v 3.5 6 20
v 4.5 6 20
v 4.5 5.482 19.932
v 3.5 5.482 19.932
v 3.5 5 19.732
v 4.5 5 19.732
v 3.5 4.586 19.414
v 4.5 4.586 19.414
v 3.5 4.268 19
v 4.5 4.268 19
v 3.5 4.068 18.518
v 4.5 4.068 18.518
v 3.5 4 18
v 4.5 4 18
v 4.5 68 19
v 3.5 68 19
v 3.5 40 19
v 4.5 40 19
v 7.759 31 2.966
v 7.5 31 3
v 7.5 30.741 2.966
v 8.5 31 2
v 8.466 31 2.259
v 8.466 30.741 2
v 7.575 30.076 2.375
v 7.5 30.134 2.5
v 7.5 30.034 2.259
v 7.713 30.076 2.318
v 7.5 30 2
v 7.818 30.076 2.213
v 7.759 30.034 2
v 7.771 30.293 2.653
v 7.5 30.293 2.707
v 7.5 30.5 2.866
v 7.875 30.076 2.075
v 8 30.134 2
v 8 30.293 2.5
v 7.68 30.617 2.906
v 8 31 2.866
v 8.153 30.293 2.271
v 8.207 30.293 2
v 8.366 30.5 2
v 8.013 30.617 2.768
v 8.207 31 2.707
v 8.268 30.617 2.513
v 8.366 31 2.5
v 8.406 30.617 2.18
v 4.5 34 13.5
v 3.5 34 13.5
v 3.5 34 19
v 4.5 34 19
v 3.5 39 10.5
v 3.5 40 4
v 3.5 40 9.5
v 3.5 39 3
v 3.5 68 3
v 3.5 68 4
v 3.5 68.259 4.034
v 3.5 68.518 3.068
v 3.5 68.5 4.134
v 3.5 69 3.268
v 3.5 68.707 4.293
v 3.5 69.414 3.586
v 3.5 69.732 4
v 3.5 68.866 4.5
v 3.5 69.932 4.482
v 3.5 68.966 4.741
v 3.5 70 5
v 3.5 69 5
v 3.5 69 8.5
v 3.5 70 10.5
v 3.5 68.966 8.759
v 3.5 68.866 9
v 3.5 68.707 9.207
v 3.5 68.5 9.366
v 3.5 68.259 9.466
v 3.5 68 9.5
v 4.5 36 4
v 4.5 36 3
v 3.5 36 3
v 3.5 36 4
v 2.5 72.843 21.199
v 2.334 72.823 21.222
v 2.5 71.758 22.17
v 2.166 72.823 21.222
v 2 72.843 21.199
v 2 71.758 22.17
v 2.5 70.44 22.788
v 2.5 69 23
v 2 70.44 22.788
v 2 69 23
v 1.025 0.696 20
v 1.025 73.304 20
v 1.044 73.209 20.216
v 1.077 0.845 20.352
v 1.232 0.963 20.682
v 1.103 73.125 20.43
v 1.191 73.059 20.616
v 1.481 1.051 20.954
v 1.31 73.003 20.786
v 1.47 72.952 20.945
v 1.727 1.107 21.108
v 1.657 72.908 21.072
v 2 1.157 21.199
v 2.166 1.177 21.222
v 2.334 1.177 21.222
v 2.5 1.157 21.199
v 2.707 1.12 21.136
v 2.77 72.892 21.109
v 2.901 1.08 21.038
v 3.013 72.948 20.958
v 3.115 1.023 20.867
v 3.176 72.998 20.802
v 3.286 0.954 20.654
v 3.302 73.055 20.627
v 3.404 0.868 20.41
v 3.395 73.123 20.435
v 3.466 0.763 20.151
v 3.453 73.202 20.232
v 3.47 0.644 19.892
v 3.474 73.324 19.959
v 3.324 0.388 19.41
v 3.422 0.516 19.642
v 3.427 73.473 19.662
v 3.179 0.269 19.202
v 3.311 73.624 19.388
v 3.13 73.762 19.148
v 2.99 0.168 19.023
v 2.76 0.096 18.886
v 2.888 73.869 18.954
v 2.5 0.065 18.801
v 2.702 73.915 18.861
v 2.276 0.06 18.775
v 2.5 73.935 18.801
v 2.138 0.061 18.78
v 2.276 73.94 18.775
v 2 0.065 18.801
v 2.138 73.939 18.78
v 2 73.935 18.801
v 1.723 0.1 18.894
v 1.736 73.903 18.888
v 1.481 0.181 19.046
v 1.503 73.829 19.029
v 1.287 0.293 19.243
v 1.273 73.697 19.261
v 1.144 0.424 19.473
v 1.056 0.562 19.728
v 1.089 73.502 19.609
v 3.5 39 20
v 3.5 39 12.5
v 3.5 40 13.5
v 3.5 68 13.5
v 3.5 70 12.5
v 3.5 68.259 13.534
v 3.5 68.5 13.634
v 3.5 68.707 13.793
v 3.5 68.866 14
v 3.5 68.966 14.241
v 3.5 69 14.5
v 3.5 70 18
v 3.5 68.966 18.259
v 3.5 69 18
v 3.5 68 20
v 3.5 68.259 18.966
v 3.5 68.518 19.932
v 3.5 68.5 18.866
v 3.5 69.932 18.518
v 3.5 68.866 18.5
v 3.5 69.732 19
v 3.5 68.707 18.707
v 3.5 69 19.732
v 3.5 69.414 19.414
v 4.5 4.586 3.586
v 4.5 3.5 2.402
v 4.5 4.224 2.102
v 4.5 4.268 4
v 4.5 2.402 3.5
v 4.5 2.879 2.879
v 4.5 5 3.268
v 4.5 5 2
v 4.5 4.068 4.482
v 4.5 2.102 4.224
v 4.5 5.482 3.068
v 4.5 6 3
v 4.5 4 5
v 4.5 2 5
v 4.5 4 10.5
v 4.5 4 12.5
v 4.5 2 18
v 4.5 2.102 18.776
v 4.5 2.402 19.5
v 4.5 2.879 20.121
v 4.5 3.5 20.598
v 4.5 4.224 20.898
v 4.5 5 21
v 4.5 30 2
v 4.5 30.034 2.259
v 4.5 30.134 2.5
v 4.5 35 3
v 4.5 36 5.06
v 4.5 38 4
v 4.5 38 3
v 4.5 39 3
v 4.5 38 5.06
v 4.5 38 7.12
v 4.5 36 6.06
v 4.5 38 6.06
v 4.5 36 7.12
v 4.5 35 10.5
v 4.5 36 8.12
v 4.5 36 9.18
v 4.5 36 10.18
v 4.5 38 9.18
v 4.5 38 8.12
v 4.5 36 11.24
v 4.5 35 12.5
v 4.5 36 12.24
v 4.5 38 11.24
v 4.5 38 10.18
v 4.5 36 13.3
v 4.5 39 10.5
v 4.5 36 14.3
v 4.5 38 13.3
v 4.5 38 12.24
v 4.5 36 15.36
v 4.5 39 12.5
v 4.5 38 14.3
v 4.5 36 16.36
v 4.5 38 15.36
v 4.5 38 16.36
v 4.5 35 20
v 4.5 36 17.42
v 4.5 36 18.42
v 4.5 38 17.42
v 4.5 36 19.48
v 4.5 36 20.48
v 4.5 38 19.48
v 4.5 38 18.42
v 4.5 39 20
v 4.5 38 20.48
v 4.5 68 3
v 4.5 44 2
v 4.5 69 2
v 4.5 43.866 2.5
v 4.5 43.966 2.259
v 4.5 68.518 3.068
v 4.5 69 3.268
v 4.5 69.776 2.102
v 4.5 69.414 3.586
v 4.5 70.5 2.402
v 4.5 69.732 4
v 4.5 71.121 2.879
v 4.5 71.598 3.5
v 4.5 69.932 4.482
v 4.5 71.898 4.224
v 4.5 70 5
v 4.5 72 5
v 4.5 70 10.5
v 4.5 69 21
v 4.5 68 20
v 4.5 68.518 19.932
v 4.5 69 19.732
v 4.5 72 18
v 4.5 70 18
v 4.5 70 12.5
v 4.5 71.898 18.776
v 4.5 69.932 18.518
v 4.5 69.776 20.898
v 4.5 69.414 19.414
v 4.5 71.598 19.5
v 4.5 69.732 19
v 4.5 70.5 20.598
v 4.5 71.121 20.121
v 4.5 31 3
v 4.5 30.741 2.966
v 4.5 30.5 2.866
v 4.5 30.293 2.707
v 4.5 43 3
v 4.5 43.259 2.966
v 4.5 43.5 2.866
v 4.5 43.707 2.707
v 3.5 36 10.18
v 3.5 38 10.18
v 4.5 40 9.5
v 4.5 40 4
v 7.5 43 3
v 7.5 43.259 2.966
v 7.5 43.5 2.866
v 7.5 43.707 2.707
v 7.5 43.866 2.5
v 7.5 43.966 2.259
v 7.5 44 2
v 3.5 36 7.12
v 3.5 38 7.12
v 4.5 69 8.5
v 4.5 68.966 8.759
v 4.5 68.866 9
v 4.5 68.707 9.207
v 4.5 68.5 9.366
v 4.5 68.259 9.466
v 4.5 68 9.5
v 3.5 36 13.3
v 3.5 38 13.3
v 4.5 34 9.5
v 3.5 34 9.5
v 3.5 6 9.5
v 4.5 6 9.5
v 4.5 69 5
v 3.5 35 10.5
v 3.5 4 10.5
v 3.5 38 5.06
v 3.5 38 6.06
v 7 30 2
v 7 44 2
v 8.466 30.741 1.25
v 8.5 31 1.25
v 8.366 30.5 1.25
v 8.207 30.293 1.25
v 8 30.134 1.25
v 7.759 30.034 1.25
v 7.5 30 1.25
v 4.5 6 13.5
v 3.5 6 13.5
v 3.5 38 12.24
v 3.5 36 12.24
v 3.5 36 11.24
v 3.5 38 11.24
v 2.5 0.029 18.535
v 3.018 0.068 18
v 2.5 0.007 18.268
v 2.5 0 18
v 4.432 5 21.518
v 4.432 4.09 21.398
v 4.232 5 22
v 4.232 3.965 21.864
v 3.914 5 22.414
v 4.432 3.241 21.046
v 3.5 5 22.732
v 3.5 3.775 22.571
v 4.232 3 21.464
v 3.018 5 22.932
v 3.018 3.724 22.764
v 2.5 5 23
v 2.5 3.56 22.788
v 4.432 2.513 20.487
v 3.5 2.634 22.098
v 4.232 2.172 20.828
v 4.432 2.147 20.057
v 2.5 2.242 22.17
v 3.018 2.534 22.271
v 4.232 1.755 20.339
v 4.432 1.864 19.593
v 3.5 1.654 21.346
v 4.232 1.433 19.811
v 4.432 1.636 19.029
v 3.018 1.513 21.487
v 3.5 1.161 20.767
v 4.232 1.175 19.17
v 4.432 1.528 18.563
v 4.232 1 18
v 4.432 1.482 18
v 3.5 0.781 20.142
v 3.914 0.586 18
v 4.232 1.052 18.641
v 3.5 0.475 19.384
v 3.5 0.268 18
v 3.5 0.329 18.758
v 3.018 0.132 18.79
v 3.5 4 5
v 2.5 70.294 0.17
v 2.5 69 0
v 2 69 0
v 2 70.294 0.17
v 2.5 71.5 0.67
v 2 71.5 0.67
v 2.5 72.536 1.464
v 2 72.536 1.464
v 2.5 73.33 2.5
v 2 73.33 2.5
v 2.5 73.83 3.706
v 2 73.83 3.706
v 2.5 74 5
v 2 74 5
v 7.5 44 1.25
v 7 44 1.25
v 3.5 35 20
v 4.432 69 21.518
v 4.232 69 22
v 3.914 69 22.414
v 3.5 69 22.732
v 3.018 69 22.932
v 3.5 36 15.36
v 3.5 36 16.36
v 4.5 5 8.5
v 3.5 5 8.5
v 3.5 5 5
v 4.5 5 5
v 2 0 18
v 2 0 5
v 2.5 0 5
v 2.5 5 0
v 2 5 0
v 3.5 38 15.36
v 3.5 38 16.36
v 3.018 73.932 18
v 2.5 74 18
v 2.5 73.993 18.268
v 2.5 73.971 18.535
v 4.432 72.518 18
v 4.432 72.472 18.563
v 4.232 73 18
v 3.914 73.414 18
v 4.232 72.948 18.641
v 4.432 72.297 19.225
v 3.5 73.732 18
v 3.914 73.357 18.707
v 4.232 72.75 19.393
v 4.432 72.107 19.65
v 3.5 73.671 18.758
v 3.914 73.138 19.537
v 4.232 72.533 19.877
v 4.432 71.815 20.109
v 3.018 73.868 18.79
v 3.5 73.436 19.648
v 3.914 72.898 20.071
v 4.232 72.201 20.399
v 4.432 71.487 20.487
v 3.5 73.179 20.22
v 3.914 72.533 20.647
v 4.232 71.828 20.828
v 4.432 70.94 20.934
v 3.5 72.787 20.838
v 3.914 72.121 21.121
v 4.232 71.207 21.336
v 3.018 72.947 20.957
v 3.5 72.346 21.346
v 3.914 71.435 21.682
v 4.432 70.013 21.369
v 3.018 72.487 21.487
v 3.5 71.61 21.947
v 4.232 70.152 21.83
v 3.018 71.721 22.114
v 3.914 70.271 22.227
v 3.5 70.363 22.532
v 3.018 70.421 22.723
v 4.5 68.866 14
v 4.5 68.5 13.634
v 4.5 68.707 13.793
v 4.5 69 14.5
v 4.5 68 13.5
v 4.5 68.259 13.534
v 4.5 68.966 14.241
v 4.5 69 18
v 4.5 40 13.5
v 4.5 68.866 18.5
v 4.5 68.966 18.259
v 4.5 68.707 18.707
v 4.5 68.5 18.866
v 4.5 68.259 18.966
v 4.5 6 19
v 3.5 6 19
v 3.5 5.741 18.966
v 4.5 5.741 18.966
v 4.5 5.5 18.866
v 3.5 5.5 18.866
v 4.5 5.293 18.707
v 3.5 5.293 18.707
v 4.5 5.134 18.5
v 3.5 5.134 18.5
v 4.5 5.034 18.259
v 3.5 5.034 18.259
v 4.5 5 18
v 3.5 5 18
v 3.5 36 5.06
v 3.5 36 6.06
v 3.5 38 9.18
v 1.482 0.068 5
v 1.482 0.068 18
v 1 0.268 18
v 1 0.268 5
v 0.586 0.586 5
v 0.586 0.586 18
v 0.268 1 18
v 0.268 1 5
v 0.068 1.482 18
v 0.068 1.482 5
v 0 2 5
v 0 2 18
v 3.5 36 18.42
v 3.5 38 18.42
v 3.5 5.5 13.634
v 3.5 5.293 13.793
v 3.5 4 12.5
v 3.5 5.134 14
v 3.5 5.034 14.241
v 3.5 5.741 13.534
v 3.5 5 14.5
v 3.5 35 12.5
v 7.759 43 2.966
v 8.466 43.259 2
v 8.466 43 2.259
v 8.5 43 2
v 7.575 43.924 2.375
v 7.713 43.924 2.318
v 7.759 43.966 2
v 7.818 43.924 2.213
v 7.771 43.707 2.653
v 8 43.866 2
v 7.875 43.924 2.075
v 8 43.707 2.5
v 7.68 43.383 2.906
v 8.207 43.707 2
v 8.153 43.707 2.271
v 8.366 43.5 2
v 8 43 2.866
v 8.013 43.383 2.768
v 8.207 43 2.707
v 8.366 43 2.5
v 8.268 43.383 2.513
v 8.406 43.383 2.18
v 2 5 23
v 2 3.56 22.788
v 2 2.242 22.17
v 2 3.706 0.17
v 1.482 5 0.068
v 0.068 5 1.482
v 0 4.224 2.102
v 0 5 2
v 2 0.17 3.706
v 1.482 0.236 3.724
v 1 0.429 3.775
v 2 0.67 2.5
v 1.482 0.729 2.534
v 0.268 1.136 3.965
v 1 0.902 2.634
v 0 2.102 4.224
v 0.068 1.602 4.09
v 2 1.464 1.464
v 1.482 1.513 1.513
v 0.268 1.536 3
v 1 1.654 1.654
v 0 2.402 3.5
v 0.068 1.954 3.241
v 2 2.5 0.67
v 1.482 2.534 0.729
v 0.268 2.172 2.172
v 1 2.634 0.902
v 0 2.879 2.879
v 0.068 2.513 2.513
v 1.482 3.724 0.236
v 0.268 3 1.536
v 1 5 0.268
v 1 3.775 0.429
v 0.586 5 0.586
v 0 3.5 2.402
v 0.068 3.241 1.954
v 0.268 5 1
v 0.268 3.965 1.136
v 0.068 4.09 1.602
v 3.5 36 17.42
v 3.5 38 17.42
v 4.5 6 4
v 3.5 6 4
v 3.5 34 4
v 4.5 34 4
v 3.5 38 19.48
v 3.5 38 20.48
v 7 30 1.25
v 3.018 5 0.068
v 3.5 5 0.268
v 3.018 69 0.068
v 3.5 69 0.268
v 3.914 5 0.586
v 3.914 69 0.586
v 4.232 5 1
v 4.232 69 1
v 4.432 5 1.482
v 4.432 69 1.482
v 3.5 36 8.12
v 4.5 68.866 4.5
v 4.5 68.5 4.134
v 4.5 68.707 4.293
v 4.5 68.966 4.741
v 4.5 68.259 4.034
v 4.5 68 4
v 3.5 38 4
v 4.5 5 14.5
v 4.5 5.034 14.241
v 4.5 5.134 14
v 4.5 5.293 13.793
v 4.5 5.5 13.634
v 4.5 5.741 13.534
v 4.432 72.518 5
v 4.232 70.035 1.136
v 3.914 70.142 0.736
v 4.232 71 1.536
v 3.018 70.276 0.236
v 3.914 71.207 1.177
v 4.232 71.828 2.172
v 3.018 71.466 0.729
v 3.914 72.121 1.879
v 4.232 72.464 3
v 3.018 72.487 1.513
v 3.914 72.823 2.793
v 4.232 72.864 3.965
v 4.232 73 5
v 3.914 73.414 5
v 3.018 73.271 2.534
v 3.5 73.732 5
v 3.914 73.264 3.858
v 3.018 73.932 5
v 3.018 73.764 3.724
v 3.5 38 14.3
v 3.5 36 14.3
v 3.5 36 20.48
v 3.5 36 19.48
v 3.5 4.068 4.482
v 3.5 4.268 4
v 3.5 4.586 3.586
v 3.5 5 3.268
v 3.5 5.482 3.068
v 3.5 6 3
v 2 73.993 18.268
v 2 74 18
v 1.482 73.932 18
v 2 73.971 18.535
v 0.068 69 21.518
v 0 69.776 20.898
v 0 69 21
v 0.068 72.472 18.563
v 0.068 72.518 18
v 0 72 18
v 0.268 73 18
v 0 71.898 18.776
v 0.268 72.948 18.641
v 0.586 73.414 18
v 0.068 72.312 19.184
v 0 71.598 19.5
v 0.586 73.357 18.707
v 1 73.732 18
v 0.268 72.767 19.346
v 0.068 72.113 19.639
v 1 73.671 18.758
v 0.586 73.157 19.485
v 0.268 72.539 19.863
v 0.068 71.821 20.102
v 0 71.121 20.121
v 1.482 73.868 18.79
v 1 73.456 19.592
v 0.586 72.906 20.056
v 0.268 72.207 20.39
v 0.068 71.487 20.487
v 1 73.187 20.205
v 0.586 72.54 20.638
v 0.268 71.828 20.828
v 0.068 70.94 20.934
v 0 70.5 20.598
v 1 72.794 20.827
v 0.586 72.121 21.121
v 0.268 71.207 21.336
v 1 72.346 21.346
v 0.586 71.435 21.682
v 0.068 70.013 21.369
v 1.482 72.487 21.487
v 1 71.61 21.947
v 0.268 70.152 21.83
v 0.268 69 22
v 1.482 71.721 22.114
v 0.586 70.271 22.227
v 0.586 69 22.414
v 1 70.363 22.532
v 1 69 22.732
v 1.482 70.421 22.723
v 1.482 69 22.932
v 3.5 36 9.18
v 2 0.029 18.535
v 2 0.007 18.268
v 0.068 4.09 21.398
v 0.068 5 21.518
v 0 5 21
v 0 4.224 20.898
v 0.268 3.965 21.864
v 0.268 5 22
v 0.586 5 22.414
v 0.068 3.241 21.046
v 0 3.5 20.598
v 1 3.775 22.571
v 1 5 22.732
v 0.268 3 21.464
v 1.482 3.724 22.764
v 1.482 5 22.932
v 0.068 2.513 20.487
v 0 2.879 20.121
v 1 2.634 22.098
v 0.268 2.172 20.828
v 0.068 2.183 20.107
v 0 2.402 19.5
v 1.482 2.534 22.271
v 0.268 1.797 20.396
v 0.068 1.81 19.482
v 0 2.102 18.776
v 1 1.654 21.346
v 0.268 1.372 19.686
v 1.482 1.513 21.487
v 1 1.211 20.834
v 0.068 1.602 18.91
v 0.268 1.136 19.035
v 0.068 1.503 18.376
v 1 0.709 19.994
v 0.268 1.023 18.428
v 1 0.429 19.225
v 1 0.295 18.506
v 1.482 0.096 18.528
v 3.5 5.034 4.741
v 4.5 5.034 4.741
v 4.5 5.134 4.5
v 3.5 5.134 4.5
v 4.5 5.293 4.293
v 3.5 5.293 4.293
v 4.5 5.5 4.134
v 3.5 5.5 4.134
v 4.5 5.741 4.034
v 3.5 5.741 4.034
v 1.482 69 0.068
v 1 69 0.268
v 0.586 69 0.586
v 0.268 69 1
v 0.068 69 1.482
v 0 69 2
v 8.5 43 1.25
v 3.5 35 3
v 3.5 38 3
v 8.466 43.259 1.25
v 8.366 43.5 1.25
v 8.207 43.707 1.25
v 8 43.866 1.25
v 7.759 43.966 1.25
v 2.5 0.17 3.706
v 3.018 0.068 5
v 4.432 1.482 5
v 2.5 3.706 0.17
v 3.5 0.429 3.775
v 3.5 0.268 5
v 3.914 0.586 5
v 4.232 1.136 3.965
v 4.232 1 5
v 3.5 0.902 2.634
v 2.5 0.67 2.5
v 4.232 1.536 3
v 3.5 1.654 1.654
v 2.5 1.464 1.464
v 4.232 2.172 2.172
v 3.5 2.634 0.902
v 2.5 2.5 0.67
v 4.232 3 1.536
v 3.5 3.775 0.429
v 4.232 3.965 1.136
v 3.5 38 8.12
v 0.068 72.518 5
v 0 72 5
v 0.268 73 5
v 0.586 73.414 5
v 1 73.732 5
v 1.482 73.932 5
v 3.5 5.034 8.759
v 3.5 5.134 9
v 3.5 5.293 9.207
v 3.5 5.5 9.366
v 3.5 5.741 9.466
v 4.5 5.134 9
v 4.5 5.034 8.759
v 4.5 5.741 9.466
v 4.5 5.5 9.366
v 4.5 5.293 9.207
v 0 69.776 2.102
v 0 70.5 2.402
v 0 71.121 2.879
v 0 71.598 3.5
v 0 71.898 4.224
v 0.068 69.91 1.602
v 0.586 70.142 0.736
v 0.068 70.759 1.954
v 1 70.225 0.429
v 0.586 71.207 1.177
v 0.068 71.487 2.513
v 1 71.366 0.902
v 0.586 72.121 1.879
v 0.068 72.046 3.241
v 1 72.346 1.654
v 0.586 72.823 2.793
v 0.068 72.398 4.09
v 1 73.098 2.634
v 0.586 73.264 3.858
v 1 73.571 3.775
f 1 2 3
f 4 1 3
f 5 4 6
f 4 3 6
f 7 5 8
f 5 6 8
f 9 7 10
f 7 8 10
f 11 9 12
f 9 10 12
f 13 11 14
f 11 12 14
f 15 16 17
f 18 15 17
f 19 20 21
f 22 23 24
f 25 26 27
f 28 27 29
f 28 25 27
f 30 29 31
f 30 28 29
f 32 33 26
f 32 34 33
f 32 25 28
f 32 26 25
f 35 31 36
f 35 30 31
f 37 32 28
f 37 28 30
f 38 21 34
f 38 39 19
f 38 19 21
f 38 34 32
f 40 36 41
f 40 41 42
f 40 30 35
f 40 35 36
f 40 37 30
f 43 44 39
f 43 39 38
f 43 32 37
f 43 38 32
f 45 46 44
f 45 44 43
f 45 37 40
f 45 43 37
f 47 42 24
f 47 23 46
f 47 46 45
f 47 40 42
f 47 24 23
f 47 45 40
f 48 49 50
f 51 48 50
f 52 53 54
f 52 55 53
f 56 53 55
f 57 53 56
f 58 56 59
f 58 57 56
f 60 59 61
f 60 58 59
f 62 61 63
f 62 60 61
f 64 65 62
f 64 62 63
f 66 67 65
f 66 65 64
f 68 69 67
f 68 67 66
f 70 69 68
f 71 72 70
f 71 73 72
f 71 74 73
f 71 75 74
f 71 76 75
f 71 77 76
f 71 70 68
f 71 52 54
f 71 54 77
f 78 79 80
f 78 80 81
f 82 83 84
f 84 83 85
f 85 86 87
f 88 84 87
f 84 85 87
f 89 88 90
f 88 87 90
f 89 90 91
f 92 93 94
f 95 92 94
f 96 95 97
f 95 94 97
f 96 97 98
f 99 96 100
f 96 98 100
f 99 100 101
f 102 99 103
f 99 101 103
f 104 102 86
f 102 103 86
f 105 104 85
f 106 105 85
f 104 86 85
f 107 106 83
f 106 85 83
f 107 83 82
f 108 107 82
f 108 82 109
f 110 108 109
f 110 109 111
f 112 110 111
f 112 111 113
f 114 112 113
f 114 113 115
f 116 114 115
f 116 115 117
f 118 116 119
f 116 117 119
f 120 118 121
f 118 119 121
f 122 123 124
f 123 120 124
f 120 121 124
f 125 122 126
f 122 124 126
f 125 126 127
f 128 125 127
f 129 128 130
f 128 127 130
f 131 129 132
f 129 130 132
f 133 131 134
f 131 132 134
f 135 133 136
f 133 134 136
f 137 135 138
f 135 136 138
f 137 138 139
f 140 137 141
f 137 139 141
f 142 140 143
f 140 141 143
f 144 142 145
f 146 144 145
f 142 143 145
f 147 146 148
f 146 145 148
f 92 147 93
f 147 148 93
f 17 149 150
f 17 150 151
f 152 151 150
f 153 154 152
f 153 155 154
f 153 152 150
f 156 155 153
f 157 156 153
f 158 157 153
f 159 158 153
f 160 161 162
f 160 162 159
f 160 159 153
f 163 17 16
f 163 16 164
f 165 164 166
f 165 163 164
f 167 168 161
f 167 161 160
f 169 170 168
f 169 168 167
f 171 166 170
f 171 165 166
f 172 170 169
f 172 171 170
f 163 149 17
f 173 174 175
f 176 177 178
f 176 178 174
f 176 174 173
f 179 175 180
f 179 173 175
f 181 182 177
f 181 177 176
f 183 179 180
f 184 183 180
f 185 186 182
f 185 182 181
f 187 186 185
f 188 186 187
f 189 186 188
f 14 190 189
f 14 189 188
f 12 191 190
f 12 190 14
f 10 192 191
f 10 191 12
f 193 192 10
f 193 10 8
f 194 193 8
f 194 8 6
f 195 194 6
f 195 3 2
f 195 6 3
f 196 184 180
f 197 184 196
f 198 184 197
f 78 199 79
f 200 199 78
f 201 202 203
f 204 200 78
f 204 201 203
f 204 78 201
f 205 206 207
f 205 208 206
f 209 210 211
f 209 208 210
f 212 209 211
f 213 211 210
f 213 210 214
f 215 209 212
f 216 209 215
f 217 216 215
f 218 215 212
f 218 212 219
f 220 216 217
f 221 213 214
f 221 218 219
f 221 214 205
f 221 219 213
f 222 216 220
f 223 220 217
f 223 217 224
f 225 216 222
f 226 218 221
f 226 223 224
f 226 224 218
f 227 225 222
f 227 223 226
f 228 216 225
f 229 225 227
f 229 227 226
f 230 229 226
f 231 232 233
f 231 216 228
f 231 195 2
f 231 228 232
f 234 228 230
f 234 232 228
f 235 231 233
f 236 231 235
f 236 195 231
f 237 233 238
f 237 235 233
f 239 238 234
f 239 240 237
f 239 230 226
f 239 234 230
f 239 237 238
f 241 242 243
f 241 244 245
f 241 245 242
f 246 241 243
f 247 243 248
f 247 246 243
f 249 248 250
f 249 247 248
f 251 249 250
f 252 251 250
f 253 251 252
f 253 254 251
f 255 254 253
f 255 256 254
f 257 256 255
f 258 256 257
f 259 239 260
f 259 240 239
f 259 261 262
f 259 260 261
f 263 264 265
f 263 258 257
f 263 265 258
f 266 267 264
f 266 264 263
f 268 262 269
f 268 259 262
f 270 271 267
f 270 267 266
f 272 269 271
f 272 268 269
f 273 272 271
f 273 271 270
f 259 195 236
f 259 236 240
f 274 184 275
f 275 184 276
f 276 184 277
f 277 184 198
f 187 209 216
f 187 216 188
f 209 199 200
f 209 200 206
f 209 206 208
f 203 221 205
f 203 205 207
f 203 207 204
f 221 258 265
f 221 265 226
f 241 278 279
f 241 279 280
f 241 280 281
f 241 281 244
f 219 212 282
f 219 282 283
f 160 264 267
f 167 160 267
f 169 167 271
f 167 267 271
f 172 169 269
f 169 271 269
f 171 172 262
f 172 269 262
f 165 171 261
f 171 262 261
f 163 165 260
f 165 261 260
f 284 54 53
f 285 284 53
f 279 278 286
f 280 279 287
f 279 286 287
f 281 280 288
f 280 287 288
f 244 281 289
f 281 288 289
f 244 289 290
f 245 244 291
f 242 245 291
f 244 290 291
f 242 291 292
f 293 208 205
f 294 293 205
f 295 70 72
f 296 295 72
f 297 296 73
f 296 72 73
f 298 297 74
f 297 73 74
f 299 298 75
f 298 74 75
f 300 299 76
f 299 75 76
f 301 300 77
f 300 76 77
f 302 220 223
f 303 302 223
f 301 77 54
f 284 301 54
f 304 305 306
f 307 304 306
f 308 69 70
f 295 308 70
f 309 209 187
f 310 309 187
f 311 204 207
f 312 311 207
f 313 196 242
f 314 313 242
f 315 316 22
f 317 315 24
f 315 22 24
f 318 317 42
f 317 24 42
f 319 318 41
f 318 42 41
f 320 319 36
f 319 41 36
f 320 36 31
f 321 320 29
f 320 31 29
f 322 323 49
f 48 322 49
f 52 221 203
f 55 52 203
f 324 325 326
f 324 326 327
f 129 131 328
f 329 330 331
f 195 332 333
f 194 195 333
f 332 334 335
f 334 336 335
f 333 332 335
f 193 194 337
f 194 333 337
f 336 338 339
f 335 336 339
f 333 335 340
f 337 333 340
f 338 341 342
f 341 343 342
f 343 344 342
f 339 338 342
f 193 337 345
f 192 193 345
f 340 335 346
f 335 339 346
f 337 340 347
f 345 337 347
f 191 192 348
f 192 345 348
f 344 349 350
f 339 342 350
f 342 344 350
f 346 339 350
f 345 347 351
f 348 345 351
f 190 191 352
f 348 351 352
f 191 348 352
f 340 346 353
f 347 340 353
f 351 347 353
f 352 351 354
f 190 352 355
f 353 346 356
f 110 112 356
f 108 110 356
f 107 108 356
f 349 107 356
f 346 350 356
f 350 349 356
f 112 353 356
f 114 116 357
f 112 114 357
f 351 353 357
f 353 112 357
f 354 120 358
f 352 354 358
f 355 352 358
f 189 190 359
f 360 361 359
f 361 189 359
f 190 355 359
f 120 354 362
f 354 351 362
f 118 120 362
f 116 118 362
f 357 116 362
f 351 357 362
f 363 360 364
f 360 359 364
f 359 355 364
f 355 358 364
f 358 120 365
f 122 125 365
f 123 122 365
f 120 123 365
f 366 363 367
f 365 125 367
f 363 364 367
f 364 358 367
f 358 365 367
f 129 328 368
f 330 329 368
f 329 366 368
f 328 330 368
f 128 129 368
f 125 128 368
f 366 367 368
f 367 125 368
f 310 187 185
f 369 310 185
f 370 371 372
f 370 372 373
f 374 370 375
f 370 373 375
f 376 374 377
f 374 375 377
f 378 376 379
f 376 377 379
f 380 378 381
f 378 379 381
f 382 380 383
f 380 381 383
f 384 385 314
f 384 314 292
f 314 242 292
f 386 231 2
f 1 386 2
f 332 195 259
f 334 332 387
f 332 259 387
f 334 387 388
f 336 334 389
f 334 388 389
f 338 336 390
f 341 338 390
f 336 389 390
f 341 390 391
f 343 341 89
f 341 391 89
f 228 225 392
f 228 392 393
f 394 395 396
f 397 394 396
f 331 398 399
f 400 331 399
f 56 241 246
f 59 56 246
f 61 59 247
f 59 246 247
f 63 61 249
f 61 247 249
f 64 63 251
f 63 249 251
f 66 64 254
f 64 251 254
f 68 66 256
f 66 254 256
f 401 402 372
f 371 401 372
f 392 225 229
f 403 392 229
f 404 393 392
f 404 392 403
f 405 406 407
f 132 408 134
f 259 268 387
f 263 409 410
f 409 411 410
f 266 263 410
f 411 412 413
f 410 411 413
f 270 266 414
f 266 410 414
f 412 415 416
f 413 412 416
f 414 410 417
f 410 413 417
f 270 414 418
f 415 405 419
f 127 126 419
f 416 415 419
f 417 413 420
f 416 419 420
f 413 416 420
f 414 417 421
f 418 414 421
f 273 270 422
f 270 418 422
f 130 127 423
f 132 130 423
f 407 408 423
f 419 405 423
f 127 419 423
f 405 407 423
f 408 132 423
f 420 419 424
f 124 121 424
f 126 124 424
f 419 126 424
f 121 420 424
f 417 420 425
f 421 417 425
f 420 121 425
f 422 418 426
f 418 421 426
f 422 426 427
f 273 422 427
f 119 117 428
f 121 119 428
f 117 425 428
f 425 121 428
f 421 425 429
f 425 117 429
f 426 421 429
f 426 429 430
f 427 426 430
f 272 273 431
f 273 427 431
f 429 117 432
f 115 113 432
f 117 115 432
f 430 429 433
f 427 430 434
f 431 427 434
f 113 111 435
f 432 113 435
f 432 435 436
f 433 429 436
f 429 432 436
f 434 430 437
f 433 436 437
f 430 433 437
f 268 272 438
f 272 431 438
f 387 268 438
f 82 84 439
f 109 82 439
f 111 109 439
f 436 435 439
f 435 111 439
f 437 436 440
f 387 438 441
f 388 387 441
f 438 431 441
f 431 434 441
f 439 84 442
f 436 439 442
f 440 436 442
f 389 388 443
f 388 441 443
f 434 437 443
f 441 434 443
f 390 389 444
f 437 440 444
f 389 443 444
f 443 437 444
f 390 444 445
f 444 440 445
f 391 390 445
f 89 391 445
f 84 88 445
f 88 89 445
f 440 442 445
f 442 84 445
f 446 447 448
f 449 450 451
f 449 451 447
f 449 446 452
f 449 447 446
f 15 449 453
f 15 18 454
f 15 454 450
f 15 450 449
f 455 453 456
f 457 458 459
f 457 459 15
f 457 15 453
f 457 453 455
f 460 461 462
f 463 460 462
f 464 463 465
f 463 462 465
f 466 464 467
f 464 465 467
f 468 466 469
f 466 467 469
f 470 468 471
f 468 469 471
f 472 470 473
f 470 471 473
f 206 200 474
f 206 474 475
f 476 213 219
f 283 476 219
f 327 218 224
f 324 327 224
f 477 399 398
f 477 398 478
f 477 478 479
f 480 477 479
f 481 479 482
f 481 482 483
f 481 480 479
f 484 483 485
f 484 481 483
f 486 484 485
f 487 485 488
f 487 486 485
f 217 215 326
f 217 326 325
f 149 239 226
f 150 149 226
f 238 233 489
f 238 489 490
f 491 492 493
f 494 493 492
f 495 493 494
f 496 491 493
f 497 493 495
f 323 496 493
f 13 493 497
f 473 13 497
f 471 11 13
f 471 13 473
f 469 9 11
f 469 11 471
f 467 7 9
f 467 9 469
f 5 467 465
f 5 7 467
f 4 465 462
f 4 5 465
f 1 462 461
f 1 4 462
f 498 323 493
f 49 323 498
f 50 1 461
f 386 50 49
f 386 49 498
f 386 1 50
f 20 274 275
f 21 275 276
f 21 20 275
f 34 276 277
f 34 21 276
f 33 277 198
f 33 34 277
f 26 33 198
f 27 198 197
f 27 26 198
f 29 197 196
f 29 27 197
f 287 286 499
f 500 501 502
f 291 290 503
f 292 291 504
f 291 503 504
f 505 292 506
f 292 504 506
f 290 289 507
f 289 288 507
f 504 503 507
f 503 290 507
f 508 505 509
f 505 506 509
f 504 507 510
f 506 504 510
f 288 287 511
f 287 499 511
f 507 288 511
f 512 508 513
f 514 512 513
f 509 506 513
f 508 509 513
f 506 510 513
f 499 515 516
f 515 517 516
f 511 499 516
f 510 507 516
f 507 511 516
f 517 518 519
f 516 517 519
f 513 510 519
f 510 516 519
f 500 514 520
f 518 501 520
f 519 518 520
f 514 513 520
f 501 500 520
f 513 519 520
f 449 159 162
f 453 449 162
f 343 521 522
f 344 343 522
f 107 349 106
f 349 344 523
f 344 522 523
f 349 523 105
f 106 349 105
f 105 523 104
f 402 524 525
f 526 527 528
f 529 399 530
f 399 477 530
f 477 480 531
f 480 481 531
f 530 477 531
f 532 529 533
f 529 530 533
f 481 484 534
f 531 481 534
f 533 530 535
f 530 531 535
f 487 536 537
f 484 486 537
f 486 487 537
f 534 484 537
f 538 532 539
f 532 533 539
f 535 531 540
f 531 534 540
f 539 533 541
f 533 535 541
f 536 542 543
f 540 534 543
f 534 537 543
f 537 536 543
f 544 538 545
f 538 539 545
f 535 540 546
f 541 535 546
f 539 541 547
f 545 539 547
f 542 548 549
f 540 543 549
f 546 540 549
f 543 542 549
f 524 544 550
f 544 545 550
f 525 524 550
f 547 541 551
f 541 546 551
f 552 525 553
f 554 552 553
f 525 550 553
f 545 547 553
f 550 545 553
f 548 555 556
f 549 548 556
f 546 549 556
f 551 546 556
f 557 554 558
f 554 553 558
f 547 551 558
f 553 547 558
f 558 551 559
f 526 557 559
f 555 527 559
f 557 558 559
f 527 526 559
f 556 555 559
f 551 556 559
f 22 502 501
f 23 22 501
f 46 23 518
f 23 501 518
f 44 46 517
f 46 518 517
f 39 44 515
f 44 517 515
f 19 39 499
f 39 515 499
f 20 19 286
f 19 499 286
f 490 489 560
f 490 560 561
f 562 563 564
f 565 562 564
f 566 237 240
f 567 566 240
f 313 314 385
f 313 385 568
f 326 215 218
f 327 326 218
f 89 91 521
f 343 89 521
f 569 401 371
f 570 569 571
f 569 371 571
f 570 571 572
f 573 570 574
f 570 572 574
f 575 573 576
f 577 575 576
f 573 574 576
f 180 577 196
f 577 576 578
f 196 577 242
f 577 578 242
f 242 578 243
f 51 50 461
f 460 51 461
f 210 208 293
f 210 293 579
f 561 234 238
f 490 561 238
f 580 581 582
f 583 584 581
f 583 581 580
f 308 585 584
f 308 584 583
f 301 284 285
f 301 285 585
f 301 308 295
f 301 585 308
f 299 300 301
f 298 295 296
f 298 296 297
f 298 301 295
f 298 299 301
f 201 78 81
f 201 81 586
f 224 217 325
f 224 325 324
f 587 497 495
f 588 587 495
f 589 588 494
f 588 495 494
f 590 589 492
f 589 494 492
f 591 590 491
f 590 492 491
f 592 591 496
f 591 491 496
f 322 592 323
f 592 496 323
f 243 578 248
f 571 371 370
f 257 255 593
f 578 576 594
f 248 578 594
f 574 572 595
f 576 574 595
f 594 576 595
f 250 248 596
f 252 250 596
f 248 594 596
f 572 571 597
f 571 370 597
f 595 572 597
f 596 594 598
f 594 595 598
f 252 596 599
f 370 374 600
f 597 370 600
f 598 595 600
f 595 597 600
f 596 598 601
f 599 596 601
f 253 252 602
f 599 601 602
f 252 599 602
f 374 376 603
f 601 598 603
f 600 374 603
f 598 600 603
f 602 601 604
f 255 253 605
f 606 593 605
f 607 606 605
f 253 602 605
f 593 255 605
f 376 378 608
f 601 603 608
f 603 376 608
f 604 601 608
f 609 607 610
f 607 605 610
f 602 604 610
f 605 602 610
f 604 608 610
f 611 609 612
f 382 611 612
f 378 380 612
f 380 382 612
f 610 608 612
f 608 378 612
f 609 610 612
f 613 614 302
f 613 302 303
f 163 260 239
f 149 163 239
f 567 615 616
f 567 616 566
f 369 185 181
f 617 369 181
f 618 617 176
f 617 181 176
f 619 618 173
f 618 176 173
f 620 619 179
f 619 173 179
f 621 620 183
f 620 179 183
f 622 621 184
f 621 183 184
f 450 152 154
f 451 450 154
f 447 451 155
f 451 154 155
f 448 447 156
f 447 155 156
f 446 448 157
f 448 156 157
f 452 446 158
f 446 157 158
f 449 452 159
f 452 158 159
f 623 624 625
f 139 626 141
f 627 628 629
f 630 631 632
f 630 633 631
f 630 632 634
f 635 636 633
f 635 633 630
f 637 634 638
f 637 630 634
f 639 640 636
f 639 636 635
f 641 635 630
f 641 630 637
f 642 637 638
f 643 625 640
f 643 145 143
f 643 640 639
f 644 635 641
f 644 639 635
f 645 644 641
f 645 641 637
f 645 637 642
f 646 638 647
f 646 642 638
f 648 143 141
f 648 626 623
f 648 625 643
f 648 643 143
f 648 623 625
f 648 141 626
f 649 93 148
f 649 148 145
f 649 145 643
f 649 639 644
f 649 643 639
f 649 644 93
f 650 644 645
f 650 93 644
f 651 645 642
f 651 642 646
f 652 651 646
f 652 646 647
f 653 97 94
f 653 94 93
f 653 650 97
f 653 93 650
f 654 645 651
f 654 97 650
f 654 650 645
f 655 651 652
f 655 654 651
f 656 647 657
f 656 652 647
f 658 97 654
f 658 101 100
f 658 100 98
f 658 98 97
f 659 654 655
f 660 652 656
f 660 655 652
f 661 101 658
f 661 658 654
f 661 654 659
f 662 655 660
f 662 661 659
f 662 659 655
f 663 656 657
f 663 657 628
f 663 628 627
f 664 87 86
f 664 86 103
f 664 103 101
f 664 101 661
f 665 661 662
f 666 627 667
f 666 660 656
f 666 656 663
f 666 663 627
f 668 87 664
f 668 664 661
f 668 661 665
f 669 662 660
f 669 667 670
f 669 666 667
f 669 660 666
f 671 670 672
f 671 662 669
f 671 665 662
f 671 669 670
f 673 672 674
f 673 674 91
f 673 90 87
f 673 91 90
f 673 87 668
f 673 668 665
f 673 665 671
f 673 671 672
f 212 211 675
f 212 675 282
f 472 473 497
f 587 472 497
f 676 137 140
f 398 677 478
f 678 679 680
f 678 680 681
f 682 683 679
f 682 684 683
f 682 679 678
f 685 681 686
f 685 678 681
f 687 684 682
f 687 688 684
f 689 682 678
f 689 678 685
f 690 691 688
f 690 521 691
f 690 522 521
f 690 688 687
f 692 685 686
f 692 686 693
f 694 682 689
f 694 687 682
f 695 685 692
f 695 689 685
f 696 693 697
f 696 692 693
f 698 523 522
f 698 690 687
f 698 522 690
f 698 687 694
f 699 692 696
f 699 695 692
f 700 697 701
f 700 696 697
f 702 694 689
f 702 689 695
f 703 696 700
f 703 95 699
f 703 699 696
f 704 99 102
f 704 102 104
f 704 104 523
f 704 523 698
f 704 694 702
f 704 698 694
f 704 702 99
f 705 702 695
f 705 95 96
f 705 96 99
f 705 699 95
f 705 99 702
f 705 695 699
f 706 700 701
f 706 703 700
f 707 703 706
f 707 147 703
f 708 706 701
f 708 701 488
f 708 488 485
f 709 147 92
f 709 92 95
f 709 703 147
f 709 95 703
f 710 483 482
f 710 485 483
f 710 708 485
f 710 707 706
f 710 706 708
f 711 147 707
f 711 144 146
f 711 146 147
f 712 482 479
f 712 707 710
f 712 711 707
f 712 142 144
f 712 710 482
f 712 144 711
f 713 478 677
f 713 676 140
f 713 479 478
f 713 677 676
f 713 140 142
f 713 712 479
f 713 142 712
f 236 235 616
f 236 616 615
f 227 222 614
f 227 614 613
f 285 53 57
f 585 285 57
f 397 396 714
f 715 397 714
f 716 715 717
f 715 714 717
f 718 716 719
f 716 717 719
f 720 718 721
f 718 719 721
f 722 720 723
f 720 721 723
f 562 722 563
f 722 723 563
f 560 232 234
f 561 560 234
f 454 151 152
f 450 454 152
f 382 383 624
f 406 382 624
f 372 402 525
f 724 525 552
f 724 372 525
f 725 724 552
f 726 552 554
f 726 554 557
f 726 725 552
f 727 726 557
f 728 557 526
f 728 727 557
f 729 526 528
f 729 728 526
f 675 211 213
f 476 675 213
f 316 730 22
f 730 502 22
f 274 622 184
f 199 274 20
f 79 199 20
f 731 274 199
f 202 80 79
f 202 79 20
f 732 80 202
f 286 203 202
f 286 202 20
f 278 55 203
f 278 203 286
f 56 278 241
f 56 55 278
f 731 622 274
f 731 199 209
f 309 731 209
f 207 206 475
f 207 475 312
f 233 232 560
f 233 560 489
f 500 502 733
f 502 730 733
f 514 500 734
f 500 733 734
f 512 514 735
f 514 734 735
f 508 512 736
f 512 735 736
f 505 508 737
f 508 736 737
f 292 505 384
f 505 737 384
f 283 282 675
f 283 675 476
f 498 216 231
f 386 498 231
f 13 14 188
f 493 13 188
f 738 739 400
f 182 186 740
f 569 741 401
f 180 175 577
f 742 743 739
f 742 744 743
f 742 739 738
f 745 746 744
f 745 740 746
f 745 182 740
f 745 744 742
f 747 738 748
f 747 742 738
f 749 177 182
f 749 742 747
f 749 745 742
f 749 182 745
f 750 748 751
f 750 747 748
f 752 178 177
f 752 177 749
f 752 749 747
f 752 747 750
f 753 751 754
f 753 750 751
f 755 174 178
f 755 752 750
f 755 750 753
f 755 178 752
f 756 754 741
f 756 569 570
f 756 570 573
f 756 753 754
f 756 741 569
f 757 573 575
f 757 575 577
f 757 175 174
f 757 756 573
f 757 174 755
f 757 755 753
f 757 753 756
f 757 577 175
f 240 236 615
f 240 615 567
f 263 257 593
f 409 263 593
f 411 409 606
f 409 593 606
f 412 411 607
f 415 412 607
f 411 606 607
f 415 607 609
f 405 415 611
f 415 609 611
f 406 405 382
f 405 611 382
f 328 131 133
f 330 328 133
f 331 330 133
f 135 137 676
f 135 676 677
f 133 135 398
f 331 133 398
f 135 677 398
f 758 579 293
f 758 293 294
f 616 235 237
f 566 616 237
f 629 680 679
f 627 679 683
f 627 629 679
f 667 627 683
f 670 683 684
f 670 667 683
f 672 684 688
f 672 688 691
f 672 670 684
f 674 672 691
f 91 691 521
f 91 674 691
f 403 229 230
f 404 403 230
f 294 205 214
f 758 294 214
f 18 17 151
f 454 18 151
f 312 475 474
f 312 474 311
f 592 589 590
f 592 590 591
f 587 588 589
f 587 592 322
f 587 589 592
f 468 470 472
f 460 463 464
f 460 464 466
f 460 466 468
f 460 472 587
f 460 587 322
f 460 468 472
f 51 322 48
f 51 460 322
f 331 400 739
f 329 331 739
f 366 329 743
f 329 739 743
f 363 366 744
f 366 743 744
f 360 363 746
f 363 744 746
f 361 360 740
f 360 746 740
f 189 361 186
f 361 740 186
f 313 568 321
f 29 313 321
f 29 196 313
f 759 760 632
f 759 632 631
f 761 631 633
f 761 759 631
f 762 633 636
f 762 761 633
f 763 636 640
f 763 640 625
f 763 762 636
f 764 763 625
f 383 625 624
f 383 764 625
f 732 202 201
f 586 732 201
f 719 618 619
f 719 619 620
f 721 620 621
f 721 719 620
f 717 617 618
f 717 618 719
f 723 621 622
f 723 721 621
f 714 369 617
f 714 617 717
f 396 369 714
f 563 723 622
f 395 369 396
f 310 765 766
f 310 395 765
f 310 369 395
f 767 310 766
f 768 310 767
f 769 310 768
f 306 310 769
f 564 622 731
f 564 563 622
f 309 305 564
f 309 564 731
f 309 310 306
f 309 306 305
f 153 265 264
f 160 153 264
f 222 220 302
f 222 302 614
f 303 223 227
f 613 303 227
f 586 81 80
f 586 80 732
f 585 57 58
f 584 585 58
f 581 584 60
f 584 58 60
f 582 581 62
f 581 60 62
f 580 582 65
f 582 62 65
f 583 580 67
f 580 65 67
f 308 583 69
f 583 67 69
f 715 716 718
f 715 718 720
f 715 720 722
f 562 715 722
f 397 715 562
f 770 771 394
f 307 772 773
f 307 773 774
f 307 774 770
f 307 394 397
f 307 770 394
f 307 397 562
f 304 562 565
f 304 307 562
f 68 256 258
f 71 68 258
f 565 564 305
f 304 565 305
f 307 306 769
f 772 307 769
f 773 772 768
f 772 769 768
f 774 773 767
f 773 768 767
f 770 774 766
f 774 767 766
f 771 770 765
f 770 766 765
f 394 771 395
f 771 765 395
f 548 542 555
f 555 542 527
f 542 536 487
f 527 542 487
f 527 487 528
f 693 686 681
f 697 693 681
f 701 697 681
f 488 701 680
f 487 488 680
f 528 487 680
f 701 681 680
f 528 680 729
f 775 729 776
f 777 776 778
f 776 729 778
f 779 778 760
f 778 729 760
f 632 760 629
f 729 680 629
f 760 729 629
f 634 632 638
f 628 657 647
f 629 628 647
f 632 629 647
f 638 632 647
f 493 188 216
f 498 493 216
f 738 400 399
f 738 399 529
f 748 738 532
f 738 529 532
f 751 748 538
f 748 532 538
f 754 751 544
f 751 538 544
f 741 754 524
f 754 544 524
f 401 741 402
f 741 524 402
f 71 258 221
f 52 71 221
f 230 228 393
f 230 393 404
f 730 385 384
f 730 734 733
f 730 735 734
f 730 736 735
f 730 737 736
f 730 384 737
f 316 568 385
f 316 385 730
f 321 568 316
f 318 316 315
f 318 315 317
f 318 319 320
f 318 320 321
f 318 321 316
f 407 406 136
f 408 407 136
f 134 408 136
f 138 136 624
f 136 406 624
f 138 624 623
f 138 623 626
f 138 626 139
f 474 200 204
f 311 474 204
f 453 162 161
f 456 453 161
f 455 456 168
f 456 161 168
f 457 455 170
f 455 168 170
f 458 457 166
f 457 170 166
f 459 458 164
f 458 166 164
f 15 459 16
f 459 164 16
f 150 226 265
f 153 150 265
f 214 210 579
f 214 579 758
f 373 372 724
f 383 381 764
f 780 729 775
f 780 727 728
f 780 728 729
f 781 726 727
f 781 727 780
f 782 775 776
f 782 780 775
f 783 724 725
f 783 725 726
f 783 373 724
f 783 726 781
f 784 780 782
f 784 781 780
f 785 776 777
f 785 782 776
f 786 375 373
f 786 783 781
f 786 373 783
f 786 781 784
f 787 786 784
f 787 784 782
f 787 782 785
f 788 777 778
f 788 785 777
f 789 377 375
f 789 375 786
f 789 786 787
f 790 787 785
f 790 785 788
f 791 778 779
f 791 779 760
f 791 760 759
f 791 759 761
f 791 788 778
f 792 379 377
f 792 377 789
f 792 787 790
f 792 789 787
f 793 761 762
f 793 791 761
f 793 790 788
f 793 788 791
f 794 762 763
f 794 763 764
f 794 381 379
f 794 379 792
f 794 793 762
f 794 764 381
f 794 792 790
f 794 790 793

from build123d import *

# Parameters (mm, degrees)
F1_DEPTH     = 4.5
F2_R         = 1.225
F3_DEPTH     = 74
F4_T1_DEPTH  = 64
F4_T3_DEPTH  = 13
F4_T6_ANGLE  = 90
F4_T8_ANGLE  = 90
F4_T10_ANGLE = 90
F4_T12_ANGLE = 90
F4_T14_ANGLE = 90
F4_T16_ANGLE = 90
F4_T18_ANGLE = 90
F4_T20_ANGLE = 90
F6_DEPTH     = 1
F7_W         = 2
F7_H         = 1
F8_DEPTH     = 1
F10_DEPTH    = 1
F11_W        = 14
F11_H        = 1
F12_DEPTH    = 4
F13_W        = 1.5
F13_H        = 14
F14_DEPTH    = 0.75
F15_R        = 0.99999


# Not quite as in the source:
# - a fillet or chamfer that OpenCascade refuses, or shapes differently, is made with other operations: its cross-section is extruded or revolved along the edge and cut away or added
# - a fillet or chamfer is up to 0.001 mm smaller than in the source, because OpenCascade refuses the exact size


with BuildPart() as f1:
    # F0 (on Right) → F1 (new body)
    with BuildSketch(Plane.YZ):
        with BuildLine():
            ThreePointArc((0, 5), (1.4644660941, 1.4644660941), (5, 0))
            Line((5, 0), (69, 0))
            ThreePointArc((69, 0), (72.5355339059, 1.4644660941), (74, 5))
            Line((74, 5), (74, 18))
            ThreePointArc((74, 18), (72.5355339059, 21.5355339059), (69, 23))
            Line((69, 23), (5, 23))
            ThreePointArc((5, 23), (1.4644660941, 21.5355339059), (0, 18))
            Line((0, 18), (0, 5))
        make_face()
    extrude(amount=F1_DEPTH)

    # F2 (on face) → F3 (cut, through all)
    with BuildSketch(Plane(origin=(0, 74, 0), x_dir=(-1, 0, 0), z_dir=(0, 1, 0))):
        with Locations((-2.25, 20)):
            Circle(F2_R)
    extrude(amount=-F3_DEPTH, mode=Mode.SUBTRACT)

    # F4: fillet of radius 2 on 16 edges, made by hand

    # F4_s2 → F4_t1 (cut)
    with BuildSketch(Plane.XZ.offset(-69)):
        with BuildLine():
            ThreePointArc((0, 21), (0.5857864376, 22.4142135624), (2, 23))
            Line((2, 23), (0, 23))
            Line((0, 23), (0, 21))
        make_face()
        with BuildLine():
            ThreePointArc((4.5, 21), (3.9142135624, 22.4142135624), (2.5, 23))
            Line((2.5, 23), (4.5, 23))
            Line((4.5, 23), (4.5, 21))
        make_face()
        with BuildLine():
            ThreePointArc((2, 0), (0.5857864376, 0.5857864376), (0, 2))
            Line((0, 2), (0, 0))
            Line((0, 0), (2, 0))
        make_face()
        with BuildLine():
            ThreePointArc((2.5, 0), (3.9142135624, 0.5857864376), (4.5, 2))
            Line((4.5, 2), (4.5, 0))
            Line((4.5, 0), (2.5, 0))
        make_face()
    extrude(amount=F4_T1_DEPTH, mode=Mode.SUBTRACT)

    # F4_s4 → F4_t3 (cut)
    with BuildSketch(Plane.XY.offset(5)):
        with BuildLine():
            ThreePointArc((2, 0), (0.5857864376, 0.5857864376), (0, 2))
            Line((0, 2), (0, 0))
            Line((0, 0), (2, 0))
        make_face()
        with BuildLine():
            ThreePointArc((2.5, 0), (3.9142135624, 0.5857864376), (4.5, 2))
            Line((4.5, 2), (4.5, 0))
            Line((4.5, 0), (2.5, 0))
        make_face()
        with BuildLine():
            ThreePointArc((0, 72), (0.5857864376, 73.4142135624), (2, 74))
            Line((2, 74), (0, 74))
            Line((0, 74), (0, 72))
        make_face()
        with BuildLine():
            ThreePointArc((4.5, 72), (3.9142135624, 73.4142135624), (2.5, 74))
            Line((2.5, 74), (4.5, 74))
            Line((4.5, 74), (4.5, 72))
        make_face()
    extrude(amount=F4_T3_DEPTH, mode=Mode.SUBTRACT)

    # F4_s5 → F4_t6 (revolve, cut)
    with BuildSketch(Plane.XY.offset(5)):
        with BuildLine():
            ThreePointArc((2, 0), (0.5857864376, 0.5857864376), (0, 2))
            Line((0, 2), (0, 0))
            Line((0, 0), (2, 0))
        make_face()
    revolve(axis=Axis((0, 5, 5), (1, 0, 0)), revolution_arc=F4_T6_ANGLE, mode=Mode.SUBTRACT)

    # F4_s7 → F4_t8 (revolve, cut)
    with BuildSketch(Plane.XY.offset(5)):
        with BuildLine():
            ThreePointArc((2.5, 0), (3.9142135624, 0.5857864376), (4.5, 2))
            Line((4.5, 2), (4.5, 0))
            Line((4.5, 0), (2.5, 0))
        make_face()
    revolve(axis=Axis((4.5, 5, 5), (1, 0, 0)), revolution_arc=F4_T8_ANGLE, mode=Mode.SUBTRACT)

    # F4_s9 → F4_t10 (revolve, cut)
    with BuildSketch(Plane.XZ.offset(-69)):
        with BuildLine():
            ThreePointArc((0, 2), (0.5857864376, 0.5857864376), (2, 0))
            Line((2, 0), (0, 0))
            Line((0, 0), (0, 2))
        make_face()
    revolve(axis=Axis((0, 69, 5), (1, 0, 0)), revolution_arc=F4_T10_ANGLE, mode=Mode.SUBTRACT)

    # F4_s11 → F4_t12 (revolve, cut)
    with BuildSketch(Plane.XY.offset(18)):
        with BuildLine():
            ThreePointArc((0, 72), (0.5857864376, 73.4142135624), (2, 74))
            Line((2, 74), (0, 74))
            Line((0, 74), (0, 72))
        make_face()
    revolve(axis=Axis((0, 69, 18), (1, 0, 0)), revolution_arc=F4_T12_ANGLE, mode=Mode.SUBTRACT)

    # F4_s13 → F4_t14 (revolve, cut)
    with BuildSketch(Plane.XZ.offset(-5)):
        with BuildLine():
            ThreePointArc((0, 21), (0.5857864376, 22.4142135624), (2, 23))
            Line((2, 23), (0, 23))
            Line((0, 23), (0, 21))
        make_face()
    revolve(axis=Axis((0, 5, 18), (1, 0, 0)), revolution_arc=F4_T14_ANGLE, mode=Mode.SUBTRACT)

    # F4_s15 → F4_t16 (revolve, cut)
    with BuildSketch(Plane.XZ.offset(-69)):
        with BuildLine():
            ThreePointArc((4.5, 2), (3.9142135624, 0.5857864376), (2.5, 0))
            Line((2.5, 0), (4.5, 0))
            Line((4.5, 0), (4.5, 2))
        make_face()
    revolve(axis=Axis((4.5, 69, 5), (1, 0, 0)), revolution_arc=F4_T16_ANGLE, mode=Mode.SUBTRACT)

    # F4_s17 → F4_t18 (revolve, cut)
    with BuildSketch(Plane.XY.offset(18)):
        with BuildLine():
            ThreePointArc((4.5, 72), (3.9142135624, 73.4142135624), (2.5, 74))
            Line((2.5, 74), (4.5, 74))
            Line((4.5, 74), (4.5, 72))
        make_face()
    revolve(axis=Axis((4.5, 69, 18), (1, 0, 0)), revolution_arc=F4_T18_ANGLE, mode=Mode.SUBTRACT)

    # F4_s19 → F4_t20 (revolve, cut)
    with BuildSketch(Plane.XZ.offset(-5)):
        with BuildLine():
            ThreePointArc((4.5, 21), (3.9142135624, 22.4142135624), (2.5, 23))
            Line((2.5, 23), (4.5, 23))
            Line((4.5, 23), (4.5, 21))
        make_face()
    revolve(axis=Axis((4.5, 5, 18), (1, 0, 0)), revolution_arc=F4_T20_ANGLE, mode=Mode.SUBTRACT)

    # F5 (on face) → F6 (cut)
    with BuildSketch(Plane.YZ.offset(4.5)):
        with BuildLine():
            Line((35, 20), (6, 20))
            ThreePointArc((6, 20), (4.5857864376, 19.4142135624), (4, 18))
            Line((4, 18), (4, 12.5))
            Line((4, 12.5), (35, 12.5))
            Line((35, 12.5), (35, 20))
        make_face()
        with BuildLine():
            ThreePointArc((4, 5), (4.5857864376, 3.5857864376), (6, 3))
            Line((6, 3), (35, 3))
            Line((35, 3), (35, 10.5))
            Line((35, 10.5), (4, 10.5))
            Line((4, 10.5), (4, 5))
        make_face()
        with BuildLine():
            Line((68, 20), (39, 20))
            Line((39, 20), (39, 12.5))
            Line((39, 12.5), (70, 12.5))
            Line((70, 12.5), (70, 18))
            ThreePointArc((70, 18), (69.4142135624, 19.4142135624), (68, 20))
        make_face()
        with BuildLine():
            Line((39, 10.5), (39, 3))
            Line((39, 3), (68, 3))
            ThreePointArc((68, 3), (69.4142135624, 3.5857864376), (70, 5))
            Line((70, 5), (70, 10.5))
            Line((70, 10.5), (39, 10.5))
        make_face()
    extrude(amount=-F6_DEPTH, mode=Mode.SUBTRACT)

    # F7 (on face) → F8 (cut)
    with BuildSketch(Plane.YZ.offset(4.5)):
        with Locations((37, 3.5)):
            Rectangle(F7_W, F7_H)
        with Locations((37, 5.56)):
            Rectangle(F7_W, F7_H)
        with Locations((37, 7.62)):
            Rectangle(F7_W, F7_H)
        with Locations((37, 9.68)):
            Rectangle(F7_W, F7_H)
        with Locations((37, 11.74)):
            Rectangle(F7_W, F7_H)
        with Locations((37, 13.8)):
            Rectangle(F7_W, F7_H)
        with Locations((37, 15.86)):
            Rectangle(F7_W, F7_H)
        with Locations((37, 17.92)):
            Rectangle(F7_W, F7_H)
        with Locations((37, 19.98)):
            Rectangle(F7_W, F7_H)
    extrude(amount=-F8_DEPTH, mode=Mode.SUBTRACT)

    # F9 (on face) → F10 (join)
    with BuildSketch(Plane.YZ.offset(3.5)):
        with BuildLine():
            ThreePointArc((5, 5), (5.2928932188, 4.2928932188), (6, 4))
            Line((6, 4), (34, 4))
            Line((34, 4), (34, 9.5))
            Line((34, 9.5), (6, 9.5))
            ThreePointArc((6, 9.5), (5.2928932188, 9.2071067812), (5, 8.5))
            Line((5, 8.5), (5, 5))
        make_face()
        with BuildLine():
            Line((34, 19), (6, 19))
            ThreePointArc((6, 19), (5.2928932188, 18.7071067812), (5, 18))
            Line((5, 18), (5, 14.5))
            ThreePointArc((5, 14.5), (5.2928932188, 13.7928932188), (6, 13.5))
            Line((6, 13.5), (34, 13.5))
            Line((34, 13.5), (34, 19))
        make_face()
        with BuildLine():
            ThreePointArc((69, 8.5), (68.7071067812, 9.2071067812), (68, 9.5))
            Line((68, 9.5), (40, 9.5))
            Line((40, 9.5), (40, 4))
            Line((40, 4), (68, 4))
            ThreePointArc((68, 4), (68.7071067812, 4.2928932188), (69, 5))
            Line((69, 5), (69, 8.5))
        make_face()
        with BuildLine():
            ThreePointArc((68, 13.5), (68.7071067812, 13.7928932188), (69, 14.5))
            Line((69, 14.5), (69, 18))
            ThreePointArc((69, 18), (68.7071067812, 18.7071067812), (68, 19))
            Line((68, 19), (40, 19))
            Line((40, 19), (40, 13.5))
            Line((40, 13.5), (68, 13.5))
        make_face()
    extrude(amount=F10_DEPTH)

    # F11 (on face) → F12 (join)
    with BuildSketch(Plane.YZ.offset(4.5)):
        with Locations((37, 2.5)):
            Rectangle(F11_W, F11_H)
    extrude(amount=F12_DEPTH)

    # F13 (on face) → F14 (join)
    with BuildSketch(Plane(origin=(0, 0, 2), x_dir=(1, 0, 0), z_dir=(0, 0, -1))):
        with Locations((7.75, -37)):
            Rectangle(F13_W, F13_H)
    extrude(amount=F14_DEPTH)

    # F15 (radius 1 in the source; OpenCascade refuses exactly that, so slightly less here)
    f15_edges = [f1.edges().sort_by_distance(p)[0] for p in [
        (8.5, 37, 3),
        (6.5, 30, 3),
        (6.5, 44, 3),
        (8.5, 44, 2.125),
        (8.5, 30, 2.125),
    ]]
    fillet(f15_edges, radius=F15_R)


solid = f1.part
